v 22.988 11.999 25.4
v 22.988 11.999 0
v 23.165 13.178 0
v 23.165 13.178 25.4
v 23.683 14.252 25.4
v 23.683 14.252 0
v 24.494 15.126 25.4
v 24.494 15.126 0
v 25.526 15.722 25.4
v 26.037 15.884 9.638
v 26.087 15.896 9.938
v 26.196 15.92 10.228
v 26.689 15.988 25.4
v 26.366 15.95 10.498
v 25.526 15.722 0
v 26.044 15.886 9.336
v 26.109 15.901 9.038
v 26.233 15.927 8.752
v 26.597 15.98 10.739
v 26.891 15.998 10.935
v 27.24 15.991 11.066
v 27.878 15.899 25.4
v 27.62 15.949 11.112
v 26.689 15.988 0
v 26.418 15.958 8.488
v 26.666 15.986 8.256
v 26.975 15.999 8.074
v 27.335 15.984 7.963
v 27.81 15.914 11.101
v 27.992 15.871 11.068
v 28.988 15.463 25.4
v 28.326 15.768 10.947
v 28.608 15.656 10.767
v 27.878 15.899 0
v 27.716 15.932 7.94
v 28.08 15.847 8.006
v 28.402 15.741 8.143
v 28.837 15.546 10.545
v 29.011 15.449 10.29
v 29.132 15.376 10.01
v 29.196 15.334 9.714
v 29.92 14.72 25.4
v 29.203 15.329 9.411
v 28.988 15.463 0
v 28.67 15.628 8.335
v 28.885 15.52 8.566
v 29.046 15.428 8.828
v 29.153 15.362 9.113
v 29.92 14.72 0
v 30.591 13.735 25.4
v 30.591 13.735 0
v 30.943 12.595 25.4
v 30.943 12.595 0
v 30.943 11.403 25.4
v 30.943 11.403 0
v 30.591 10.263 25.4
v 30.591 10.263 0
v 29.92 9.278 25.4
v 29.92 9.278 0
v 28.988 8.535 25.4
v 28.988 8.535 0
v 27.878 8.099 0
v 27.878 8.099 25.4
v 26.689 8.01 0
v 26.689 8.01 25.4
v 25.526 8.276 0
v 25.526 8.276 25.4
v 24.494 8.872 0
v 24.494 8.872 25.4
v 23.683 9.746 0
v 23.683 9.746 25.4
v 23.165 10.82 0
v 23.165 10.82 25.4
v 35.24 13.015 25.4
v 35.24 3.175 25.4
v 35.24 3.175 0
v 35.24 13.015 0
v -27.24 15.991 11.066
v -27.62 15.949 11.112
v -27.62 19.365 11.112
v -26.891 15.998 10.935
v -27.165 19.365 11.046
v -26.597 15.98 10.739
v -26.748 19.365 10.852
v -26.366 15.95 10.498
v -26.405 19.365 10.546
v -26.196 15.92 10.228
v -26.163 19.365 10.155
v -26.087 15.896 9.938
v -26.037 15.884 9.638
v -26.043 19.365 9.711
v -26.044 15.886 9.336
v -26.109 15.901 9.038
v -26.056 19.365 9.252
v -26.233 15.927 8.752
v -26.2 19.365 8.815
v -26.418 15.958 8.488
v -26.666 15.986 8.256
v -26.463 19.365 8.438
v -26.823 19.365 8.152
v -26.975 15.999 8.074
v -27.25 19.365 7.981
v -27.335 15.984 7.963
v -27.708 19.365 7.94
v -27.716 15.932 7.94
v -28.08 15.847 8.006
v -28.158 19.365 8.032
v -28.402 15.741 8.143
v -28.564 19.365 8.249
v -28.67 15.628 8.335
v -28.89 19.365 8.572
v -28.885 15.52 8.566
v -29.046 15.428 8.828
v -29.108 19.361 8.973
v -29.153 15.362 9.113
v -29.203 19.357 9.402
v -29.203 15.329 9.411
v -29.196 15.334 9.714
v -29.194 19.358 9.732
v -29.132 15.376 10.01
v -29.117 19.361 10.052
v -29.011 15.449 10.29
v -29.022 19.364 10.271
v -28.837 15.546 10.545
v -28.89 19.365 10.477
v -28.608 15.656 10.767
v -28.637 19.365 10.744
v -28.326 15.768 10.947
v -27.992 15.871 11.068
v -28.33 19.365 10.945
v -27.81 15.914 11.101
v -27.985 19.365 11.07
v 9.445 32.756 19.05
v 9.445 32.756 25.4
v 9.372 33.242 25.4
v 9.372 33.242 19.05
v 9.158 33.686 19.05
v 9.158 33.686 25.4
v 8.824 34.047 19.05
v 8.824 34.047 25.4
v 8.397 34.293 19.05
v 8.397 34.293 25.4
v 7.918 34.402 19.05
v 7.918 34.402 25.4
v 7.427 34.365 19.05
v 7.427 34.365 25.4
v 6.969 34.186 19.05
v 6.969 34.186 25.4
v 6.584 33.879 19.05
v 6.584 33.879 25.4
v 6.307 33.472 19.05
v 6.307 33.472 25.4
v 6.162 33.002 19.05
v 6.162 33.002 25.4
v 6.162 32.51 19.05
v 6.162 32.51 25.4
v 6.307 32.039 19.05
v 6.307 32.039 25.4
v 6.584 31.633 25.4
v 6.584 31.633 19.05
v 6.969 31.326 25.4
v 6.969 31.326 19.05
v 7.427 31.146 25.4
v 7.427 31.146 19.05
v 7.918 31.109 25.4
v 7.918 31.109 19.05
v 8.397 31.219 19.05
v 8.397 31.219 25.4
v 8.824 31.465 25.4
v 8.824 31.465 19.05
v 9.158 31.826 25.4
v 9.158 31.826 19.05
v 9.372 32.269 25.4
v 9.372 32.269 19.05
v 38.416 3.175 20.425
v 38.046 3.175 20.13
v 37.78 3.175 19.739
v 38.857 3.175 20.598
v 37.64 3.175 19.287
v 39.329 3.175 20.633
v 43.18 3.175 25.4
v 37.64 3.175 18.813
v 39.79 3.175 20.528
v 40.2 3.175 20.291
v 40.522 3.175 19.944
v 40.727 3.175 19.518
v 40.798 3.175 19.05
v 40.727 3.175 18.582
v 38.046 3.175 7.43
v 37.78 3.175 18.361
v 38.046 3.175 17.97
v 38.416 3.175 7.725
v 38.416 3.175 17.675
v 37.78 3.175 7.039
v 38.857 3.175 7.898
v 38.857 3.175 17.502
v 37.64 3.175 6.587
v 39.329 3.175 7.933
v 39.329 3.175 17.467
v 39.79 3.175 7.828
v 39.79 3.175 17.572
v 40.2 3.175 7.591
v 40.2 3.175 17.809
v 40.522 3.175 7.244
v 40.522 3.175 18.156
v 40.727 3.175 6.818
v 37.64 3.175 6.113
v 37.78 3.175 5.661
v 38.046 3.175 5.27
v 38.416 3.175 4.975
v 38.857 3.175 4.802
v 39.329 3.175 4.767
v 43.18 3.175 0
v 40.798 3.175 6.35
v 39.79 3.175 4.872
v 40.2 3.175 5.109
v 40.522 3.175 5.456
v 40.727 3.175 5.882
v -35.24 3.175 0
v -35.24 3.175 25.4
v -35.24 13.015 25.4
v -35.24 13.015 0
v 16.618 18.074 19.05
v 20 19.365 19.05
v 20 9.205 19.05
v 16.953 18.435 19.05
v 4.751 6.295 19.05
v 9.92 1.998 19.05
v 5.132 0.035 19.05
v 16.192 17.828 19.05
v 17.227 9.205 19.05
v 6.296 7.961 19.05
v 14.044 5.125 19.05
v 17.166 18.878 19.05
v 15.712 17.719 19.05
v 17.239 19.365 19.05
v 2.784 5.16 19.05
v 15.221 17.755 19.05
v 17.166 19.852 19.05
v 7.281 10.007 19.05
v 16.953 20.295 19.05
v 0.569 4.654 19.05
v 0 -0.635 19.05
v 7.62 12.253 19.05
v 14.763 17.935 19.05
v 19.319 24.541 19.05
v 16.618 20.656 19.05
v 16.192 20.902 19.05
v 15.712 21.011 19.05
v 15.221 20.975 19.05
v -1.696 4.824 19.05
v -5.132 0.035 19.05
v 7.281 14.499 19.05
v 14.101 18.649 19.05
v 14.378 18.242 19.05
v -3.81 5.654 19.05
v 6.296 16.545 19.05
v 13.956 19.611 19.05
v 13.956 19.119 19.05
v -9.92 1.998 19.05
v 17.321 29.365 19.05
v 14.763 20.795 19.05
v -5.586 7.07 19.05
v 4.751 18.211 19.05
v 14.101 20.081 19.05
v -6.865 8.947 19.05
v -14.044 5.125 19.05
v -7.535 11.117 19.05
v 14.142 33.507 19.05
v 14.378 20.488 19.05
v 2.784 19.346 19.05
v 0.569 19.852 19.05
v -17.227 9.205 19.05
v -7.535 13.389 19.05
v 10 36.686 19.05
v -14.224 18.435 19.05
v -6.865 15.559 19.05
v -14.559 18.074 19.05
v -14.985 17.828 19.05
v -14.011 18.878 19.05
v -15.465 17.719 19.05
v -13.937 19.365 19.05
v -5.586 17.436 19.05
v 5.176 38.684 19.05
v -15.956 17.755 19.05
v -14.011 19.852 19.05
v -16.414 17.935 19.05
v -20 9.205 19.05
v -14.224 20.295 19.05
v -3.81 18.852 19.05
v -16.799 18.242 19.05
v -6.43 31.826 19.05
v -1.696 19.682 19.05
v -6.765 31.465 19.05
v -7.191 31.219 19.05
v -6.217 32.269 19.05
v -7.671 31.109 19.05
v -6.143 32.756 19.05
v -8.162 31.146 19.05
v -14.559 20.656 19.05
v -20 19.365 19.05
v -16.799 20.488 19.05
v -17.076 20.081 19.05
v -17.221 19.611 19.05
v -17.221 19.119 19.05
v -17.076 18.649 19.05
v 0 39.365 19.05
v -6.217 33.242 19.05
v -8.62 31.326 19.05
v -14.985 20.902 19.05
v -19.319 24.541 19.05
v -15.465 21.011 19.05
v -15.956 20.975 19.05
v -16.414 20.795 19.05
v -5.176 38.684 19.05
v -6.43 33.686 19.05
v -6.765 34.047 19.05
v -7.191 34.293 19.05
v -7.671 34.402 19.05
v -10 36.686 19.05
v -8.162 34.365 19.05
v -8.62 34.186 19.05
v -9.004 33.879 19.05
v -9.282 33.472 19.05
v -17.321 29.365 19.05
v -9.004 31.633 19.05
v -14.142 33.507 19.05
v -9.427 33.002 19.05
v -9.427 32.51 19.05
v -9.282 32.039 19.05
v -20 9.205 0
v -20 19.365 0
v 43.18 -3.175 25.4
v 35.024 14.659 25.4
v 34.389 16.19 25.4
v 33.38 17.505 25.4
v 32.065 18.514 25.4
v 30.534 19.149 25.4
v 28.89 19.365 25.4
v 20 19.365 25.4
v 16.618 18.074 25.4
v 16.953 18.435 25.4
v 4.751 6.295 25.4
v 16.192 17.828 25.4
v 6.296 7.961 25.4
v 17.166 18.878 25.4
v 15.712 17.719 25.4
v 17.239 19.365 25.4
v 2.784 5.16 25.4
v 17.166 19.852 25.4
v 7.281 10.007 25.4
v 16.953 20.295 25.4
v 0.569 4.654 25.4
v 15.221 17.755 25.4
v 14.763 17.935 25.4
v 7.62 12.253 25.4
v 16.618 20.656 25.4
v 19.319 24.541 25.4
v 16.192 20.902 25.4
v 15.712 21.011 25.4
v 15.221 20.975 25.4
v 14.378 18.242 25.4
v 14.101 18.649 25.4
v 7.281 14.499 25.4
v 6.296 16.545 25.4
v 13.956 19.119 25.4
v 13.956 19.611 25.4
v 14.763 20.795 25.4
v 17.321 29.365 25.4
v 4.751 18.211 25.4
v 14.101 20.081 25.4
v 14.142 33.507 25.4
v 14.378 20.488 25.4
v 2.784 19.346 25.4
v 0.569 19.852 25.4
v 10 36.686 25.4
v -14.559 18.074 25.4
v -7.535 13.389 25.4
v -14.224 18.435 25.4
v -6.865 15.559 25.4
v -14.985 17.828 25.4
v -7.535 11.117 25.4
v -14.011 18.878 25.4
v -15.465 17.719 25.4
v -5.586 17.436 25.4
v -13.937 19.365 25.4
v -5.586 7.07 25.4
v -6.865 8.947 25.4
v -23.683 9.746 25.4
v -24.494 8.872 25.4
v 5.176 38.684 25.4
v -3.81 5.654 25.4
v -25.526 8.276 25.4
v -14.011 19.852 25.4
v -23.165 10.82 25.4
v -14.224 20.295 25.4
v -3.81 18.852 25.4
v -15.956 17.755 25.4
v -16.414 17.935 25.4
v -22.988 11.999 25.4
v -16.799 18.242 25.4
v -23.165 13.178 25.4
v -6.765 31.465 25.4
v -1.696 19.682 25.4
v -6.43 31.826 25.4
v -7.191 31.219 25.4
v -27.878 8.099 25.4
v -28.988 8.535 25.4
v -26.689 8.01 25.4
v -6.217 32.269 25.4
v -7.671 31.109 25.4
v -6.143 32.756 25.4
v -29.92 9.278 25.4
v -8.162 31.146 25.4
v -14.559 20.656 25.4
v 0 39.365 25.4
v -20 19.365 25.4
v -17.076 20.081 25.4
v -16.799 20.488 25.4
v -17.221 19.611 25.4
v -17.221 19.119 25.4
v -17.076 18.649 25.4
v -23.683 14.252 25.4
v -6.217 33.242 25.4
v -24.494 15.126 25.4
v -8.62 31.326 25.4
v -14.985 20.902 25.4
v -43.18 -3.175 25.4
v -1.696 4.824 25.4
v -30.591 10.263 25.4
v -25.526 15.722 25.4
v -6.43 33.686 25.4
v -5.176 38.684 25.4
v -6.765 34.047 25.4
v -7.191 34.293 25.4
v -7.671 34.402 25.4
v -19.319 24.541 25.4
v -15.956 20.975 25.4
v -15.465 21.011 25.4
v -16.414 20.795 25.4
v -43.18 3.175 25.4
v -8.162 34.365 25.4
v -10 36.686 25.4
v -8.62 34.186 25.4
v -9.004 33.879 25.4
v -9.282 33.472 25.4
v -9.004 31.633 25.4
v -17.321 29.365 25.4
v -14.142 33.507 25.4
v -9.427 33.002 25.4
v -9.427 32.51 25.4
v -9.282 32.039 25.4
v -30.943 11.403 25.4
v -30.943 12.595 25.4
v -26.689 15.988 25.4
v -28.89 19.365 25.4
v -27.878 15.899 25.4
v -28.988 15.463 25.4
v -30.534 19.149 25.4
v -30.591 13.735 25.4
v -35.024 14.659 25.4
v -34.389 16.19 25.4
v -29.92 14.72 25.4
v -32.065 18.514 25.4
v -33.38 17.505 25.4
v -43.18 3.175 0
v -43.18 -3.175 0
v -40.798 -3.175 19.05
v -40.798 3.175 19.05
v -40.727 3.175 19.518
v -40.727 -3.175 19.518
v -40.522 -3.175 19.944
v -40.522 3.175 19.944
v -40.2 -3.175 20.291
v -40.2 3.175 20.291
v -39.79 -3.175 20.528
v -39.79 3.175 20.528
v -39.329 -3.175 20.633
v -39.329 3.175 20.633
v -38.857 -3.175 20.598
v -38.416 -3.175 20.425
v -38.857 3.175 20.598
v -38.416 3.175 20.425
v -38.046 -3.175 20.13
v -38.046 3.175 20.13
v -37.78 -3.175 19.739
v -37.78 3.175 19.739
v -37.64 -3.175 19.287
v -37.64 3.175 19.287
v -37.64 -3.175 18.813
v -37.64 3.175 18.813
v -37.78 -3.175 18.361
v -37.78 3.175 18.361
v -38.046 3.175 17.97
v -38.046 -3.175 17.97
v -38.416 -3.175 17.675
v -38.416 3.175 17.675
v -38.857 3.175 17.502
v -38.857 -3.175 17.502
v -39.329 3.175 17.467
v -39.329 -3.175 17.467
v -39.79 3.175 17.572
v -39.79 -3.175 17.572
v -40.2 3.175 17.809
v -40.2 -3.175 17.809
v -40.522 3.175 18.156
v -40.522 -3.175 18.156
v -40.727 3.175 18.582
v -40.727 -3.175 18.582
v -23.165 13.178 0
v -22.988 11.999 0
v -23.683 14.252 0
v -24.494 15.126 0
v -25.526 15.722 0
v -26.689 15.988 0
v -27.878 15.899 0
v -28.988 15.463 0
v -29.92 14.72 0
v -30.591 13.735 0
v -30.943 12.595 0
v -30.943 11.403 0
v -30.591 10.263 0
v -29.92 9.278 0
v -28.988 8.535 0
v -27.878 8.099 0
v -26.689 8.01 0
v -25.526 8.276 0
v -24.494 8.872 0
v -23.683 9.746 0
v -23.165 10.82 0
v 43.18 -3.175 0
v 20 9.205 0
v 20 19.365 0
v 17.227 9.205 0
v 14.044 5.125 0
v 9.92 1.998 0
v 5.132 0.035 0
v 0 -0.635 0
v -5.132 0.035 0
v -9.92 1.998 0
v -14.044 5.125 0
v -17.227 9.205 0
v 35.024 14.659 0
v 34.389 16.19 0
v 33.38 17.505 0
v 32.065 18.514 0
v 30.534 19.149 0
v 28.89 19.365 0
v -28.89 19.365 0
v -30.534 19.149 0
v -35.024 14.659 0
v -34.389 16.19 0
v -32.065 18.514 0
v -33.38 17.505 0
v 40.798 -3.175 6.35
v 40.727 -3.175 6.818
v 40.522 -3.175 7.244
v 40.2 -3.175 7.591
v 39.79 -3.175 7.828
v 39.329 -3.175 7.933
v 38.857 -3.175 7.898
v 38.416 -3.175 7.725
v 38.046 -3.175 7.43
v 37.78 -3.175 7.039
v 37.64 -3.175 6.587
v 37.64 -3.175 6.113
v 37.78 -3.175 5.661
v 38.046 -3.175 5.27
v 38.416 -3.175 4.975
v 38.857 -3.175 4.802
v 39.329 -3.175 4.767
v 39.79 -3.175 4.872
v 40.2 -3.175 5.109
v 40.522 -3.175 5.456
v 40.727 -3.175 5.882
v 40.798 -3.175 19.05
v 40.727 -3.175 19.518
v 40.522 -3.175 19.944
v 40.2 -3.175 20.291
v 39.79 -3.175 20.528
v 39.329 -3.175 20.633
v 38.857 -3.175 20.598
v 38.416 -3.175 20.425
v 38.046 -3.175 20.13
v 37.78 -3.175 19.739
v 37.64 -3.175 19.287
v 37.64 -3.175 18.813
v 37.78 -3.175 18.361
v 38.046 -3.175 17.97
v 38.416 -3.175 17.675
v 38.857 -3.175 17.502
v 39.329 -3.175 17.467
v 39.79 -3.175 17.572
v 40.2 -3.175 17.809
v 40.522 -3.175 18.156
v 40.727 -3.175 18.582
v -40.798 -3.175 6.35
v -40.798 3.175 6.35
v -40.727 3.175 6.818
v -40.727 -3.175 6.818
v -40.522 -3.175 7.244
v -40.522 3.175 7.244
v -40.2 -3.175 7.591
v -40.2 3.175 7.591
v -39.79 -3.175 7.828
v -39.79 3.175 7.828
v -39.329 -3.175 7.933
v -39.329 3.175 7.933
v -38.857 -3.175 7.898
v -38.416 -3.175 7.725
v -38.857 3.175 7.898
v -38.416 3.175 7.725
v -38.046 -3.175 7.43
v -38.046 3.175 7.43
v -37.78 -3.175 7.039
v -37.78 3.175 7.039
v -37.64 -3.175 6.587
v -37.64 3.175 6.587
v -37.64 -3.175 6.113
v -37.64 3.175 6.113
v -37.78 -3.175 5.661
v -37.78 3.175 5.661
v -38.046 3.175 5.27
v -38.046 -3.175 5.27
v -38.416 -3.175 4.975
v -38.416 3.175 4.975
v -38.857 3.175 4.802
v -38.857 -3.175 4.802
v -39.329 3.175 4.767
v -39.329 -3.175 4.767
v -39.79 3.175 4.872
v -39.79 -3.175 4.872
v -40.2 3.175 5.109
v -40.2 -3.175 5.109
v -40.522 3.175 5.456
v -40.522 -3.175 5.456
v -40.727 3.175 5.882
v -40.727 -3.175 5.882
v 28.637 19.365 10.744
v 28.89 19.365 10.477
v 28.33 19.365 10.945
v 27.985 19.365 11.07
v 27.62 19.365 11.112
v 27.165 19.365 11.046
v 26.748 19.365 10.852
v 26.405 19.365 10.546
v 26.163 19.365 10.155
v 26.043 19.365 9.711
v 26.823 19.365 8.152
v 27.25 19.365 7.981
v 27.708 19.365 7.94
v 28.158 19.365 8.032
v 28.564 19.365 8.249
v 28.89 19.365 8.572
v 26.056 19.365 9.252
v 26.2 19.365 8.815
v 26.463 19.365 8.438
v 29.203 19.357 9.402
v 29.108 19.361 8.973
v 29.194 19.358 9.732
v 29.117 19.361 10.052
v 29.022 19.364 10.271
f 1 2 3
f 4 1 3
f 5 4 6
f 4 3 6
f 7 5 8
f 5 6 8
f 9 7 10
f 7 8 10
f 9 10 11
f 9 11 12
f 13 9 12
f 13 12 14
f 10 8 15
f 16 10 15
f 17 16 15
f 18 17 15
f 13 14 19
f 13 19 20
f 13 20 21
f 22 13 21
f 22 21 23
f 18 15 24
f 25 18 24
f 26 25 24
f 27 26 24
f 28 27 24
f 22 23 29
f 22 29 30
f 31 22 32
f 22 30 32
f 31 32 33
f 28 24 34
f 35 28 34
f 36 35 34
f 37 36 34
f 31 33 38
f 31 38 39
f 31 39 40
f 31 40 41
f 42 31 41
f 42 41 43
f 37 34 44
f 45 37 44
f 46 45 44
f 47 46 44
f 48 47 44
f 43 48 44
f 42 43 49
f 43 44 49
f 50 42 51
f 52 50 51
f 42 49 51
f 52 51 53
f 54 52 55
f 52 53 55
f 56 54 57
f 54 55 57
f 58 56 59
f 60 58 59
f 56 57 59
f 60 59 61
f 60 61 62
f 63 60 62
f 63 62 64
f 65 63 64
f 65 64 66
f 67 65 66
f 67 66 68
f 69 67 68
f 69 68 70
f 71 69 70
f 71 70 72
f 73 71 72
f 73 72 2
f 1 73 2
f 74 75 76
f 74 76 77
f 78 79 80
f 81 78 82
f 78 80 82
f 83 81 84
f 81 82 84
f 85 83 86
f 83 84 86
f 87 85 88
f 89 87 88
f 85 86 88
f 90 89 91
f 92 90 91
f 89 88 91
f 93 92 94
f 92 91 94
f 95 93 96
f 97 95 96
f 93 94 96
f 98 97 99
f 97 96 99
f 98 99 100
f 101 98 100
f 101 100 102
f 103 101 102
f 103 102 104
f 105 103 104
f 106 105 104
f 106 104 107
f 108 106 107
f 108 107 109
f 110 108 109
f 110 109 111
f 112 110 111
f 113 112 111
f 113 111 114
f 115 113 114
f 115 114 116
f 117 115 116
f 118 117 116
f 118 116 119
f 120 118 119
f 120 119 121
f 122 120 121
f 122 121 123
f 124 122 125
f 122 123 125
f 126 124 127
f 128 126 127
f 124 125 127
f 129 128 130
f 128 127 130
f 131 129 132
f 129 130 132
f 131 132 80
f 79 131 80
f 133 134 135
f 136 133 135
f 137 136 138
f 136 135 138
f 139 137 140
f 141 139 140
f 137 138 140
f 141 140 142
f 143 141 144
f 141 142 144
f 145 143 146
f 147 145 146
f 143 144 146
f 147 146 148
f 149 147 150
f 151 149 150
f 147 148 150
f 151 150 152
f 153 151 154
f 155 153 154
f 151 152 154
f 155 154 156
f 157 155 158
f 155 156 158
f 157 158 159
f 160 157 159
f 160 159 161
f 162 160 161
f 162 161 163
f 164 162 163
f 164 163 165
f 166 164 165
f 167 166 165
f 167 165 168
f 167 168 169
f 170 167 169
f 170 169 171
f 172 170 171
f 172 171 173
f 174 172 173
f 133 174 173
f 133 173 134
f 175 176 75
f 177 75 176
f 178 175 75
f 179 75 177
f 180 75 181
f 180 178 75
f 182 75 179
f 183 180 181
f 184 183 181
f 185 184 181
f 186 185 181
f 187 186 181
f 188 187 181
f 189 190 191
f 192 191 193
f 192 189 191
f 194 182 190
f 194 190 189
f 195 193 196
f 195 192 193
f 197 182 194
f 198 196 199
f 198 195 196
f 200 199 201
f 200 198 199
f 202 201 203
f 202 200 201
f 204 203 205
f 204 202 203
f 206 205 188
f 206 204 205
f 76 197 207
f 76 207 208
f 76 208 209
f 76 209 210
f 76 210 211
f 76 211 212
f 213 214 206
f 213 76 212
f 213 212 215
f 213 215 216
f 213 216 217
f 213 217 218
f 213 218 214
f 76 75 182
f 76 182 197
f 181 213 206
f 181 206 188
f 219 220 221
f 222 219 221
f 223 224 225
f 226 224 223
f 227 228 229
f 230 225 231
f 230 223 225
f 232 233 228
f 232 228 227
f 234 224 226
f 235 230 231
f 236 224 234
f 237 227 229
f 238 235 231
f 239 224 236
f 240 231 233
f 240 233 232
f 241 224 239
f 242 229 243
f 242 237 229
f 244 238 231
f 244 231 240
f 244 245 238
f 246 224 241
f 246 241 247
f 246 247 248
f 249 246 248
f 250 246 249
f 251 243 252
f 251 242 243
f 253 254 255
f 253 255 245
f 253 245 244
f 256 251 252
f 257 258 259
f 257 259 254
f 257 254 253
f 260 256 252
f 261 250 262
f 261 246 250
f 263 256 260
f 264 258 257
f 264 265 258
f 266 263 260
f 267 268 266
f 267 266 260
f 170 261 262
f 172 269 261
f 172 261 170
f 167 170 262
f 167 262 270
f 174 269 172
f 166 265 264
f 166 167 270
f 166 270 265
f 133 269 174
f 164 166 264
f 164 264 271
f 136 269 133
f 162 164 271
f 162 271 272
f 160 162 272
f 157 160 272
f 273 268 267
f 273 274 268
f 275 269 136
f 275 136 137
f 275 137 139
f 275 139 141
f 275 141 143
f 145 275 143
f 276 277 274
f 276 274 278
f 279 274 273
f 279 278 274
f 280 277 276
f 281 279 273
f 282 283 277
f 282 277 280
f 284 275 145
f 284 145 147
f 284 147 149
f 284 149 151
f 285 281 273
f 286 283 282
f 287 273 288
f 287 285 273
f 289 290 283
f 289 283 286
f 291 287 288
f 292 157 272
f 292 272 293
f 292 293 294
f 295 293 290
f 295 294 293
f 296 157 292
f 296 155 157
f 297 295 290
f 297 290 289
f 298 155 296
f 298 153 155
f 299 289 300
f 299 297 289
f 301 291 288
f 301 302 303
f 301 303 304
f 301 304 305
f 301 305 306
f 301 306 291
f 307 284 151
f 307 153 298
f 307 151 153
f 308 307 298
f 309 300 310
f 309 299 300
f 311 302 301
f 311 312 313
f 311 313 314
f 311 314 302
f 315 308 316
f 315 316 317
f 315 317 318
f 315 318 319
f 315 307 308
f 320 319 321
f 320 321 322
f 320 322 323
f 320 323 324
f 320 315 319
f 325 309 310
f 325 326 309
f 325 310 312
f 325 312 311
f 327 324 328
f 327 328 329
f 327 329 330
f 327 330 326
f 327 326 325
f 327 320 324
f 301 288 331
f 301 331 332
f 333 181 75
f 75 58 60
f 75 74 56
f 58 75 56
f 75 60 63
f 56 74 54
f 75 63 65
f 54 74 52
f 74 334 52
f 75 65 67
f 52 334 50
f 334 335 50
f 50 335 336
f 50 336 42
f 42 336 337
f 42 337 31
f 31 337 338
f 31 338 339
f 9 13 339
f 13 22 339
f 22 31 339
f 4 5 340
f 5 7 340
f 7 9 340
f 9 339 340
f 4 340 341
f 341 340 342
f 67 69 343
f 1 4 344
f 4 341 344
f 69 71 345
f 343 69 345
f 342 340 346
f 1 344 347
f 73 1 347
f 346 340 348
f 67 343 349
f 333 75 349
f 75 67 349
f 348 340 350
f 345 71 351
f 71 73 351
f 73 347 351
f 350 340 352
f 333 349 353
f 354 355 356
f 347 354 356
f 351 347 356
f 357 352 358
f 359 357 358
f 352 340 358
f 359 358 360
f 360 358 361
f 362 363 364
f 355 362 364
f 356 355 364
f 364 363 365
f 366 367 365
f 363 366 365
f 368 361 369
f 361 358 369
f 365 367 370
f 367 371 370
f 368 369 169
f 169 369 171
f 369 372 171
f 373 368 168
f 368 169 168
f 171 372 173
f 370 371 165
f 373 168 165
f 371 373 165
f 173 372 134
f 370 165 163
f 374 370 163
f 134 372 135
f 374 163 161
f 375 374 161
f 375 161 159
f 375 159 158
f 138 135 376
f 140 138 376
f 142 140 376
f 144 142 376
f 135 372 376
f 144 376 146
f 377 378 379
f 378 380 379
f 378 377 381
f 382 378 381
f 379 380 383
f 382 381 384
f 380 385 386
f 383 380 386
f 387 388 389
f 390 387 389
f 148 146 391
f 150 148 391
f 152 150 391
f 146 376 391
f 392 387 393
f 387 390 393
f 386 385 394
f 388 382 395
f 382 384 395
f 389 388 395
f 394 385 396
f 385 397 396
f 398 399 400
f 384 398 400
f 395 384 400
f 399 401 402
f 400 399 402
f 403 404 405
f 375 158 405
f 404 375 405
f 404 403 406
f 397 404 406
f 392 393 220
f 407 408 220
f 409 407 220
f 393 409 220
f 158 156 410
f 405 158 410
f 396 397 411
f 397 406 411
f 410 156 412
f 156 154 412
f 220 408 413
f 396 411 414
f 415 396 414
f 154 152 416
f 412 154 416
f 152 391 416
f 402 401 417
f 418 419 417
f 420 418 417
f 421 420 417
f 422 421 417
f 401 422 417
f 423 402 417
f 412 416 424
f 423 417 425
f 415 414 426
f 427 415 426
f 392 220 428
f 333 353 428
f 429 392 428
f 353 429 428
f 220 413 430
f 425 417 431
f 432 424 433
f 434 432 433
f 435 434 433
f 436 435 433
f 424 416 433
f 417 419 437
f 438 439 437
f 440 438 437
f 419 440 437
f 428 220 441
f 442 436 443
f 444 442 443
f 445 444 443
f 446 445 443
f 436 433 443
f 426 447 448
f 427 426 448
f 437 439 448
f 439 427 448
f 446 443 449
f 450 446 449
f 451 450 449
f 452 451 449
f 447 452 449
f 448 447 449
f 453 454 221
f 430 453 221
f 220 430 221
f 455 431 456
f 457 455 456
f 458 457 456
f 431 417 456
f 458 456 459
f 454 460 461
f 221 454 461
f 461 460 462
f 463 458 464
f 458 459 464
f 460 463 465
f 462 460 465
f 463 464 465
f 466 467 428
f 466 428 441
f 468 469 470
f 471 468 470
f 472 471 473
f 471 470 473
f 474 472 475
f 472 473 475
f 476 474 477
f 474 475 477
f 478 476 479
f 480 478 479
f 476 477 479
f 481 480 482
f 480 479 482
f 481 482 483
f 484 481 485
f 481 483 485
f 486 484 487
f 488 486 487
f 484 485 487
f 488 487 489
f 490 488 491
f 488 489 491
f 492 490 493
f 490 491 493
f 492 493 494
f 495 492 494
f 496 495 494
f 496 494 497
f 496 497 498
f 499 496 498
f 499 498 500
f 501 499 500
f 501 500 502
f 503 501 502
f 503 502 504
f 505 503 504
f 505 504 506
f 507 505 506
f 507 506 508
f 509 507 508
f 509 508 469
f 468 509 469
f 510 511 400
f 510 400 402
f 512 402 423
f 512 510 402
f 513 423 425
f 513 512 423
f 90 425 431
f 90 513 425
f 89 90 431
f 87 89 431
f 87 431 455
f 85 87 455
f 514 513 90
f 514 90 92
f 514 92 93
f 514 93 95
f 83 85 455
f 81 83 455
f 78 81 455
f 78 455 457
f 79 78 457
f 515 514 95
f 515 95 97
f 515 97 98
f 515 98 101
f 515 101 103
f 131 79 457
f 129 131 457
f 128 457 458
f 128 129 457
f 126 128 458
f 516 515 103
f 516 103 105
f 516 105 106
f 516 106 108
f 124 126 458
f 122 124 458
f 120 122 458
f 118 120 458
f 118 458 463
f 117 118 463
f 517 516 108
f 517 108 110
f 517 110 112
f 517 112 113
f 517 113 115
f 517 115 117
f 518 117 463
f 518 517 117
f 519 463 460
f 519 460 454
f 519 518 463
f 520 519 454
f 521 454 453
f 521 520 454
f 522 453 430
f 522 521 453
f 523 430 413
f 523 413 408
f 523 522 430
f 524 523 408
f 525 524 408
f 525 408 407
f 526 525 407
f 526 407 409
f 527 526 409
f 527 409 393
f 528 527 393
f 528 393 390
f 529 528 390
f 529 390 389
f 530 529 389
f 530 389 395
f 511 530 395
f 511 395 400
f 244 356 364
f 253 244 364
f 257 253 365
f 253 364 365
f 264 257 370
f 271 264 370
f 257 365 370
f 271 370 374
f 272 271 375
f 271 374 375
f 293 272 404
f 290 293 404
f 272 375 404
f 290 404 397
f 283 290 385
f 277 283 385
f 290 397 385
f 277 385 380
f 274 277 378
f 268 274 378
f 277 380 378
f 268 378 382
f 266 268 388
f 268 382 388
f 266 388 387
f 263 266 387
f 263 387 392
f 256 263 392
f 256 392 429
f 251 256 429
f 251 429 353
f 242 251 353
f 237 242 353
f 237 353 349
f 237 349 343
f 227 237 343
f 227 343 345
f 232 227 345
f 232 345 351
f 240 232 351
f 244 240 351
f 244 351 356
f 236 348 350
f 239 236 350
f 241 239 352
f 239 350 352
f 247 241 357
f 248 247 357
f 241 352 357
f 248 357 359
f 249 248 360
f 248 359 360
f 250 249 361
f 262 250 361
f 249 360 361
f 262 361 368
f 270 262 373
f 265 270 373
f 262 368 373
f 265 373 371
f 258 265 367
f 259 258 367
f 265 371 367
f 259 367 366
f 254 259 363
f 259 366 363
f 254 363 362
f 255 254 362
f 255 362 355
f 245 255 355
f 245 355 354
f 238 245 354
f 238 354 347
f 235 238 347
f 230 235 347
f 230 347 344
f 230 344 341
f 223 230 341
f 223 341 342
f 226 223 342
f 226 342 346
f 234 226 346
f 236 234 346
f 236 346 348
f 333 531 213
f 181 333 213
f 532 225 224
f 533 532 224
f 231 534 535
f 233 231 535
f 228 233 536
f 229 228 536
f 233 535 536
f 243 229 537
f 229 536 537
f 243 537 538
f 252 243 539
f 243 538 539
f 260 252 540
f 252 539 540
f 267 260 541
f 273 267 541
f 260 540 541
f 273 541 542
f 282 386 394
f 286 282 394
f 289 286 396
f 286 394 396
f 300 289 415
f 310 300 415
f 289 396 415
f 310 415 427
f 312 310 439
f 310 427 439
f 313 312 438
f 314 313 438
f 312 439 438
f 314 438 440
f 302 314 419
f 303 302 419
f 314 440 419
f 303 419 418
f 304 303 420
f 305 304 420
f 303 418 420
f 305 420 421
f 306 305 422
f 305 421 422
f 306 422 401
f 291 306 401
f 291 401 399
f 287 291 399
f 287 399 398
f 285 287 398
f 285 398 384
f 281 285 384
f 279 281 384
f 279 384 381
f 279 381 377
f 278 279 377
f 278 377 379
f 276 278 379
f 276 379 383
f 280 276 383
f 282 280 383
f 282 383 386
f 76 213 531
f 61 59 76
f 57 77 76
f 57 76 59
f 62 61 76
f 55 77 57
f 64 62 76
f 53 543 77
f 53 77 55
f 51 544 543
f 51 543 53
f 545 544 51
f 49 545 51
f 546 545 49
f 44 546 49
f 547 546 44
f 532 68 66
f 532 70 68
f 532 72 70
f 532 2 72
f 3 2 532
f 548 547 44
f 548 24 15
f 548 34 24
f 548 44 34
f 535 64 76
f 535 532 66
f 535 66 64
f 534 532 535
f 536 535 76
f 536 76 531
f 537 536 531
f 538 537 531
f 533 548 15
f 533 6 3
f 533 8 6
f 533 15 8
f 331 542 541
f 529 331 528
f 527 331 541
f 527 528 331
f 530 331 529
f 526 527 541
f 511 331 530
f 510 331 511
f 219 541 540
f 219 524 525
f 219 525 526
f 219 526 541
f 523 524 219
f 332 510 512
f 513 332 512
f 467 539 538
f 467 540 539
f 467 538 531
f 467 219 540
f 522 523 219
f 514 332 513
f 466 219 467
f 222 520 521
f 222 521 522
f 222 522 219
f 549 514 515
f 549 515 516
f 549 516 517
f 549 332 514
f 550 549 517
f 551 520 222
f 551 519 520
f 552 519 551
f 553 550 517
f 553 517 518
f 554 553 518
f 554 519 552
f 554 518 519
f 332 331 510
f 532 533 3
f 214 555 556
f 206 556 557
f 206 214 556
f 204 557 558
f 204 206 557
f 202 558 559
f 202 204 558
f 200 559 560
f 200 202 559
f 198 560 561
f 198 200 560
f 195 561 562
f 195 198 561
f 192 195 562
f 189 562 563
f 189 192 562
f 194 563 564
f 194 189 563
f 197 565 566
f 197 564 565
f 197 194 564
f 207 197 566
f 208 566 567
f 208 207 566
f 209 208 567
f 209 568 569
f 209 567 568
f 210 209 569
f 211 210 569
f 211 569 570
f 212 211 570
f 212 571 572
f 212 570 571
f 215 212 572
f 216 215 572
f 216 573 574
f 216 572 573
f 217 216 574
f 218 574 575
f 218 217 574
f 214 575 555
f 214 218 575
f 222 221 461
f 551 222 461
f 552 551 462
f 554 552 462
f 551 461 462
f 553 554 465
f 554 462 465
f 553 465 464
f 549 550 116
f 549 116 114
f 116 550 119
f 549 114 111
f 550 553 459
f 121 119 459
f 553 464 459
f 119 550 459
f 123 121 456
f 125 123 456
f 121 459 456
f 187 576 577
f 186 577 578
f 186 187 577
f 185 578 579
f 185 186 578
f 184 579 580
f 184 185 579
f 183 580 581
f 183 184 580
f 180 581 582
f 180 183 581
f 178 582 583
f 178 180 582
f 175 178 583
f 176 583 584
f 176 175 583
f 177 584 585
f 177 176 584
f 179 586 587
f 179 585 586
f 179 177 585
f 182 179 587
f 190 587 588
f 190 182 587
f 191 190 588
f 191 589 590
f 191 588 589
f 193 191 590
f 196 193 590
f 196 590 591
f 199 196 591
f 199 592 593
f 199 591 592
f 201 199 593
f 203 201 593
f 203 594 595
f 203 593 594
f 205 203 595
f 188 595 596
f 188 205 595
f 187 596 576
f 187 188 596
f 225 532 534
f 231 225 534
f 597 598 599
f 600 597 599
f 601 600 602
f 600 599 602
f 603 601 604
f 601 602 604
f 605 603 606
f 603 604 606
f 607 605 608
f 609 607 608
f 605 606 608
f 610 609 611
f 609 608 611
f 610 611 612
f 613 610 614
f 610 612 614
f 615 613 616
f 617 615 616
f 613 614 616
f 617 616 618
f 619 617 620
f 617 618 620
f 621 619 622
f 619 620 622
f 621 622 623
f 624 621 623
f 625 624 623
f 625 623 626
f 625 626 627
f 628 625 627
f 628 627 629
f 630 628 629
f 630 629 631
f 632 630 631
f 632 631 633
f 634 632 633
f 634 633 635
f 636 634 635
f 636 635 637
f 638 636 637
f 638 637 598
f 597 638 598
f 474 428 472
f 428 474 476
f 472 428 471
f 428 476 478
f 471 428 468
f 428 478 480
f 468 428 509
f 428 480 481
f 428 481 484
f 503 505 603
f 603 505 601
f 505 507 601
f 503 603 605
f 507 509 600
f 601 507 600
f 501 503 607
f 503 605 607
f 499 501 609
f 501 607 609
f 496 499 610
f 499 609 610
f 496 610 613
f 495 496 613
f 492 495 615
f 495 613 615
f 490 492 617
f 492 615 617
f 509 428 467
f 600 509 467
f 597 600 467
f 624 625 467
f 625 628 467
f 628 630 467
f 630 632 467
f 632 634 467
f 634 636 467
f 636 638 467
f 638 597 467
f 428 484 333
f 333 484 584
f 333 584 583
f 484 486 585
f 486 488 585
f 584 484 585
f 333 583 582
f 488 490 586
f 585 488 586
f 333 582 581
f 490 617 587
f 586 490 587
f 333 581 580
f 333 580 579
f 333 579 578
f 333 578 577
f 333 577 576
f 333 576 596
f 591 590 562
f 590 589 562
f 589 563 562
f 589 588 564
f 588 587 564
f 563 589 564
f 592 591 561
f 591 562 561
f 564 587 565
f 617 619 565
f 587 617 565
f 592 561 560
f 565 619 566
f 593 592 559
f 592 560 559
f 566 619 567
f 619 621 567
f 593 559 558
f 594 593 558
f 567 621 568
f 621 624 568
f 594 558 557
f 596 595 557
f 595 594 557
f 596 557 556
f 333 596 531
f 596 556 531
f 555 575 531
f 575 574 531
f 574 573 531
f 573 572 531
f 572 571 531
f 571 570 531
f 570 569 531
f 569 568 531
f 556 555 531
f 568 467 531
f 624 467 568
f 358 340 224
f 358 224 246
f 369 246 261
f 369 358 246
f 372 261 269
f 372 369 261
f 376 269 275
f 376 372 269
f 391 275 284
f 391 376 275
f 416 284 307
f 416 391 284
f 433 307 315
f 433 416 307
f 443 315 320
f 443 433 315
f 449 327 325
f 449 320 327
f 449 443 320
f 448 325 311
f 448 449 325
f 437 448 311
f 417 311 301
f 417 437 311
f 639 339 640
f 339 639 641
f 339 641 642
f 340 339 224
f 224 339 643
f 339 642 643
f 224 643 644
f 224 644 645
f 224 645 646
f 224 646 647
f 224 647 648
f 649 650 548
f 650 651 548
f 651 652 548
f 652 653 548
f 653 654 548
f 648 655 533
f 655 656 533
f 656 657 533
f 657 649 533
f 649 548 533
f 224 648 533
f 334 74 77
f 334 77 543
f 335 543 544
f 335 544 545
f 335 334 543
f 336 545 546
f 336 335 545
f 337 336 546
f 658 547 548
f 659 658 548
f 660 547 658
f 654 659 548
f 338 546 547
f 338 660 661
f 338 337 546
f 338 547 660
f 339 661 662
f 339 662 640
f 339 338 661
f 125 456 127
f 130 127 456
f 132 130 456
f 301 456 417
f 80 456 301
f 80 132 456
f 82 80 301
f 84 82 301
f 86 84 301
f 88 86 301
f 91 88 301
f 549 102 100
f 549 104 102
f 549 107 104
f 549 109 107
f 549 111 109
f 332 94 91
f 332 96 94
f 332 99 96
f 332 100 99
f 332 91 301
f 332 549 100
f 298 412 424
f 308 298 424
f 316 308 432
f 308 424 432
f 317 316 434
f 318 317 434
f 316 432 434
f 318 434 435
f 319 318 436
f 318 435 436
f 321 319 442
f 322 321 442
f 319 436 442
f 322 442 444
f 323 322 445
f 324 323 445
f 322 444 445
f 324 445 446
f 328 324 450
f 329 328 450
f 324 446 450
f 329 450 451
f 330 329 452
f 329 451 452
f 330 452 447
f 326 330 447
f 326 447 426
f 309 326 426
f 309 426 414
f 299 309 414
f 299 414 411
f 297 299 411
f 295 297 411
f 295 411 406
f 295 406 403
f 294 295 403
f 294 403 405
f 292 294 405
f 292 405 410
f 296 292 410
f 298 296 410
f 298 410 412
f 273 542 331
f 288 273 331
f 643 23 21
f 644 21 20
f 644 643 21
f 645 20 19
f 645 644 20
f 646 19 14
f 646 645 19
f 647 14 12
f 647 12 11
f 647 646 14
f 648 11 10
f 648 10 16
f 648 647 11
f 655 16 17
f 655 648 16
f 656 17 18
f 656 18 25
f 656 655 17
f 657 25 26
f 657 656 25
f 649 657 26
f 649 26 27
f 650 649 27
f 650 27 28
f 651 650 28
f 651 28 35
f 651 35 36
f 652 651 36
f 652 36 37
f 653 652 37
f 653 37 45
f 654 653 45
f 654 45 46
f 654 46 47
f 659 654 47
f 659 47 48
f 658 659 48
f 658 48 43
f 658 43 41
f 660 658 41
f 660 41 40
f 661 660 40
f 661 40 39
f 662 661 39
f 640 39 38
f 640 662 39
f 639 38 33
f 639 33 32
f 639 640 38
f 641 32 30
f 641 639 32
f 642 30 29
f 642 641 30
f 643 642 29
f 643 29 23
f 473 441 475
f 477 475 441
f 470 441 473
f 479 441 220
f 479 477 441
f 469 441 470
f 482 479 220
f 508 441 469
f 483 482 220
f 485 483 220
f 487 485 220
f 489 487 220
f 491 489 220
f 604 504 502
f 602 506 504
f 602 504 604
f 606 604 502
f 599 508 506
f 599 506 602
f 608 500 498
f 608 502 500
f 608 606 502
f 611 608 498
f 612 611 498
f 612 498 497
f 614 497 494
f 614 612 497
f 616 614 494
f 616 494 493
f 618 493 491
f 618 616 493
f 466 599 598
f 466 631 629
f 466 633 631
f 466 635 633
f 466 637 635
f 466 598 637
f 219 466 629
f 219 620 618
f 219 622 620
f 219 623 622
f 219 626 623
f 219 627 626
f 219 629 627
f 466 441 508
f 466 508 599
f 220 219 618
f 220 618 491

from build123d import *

# Parameters (mm, degrees)
SKETCH1_W               = 86.36
SKETCH1_H               = 6.35
BOSS_EXTRUDE1_DEPTH     = 25.4
BOSS_EXTRUDE2_DEPTH     = 25.4
SKETCH3_R               = 7.62
SKETCH3_R_2             = 1.651
CUT_EXTRUDE3_DEPTH      = 25.4
SKETCH4_R               = 20
CUT_EXTRUDE4_DEPTH      = 19.05
SKETCH6_W               = 40
SKETCH6_H               = 10.16
CUT_EXTRUDE6_DEPTH      = 19.05
BOSS_EXTRUDE3_START     = -25.4
SKETCH7_W               = 15.24
SKETCH7_H               = 16.19
SKETCH7_R               = 4
BOSS_EXTRUDE3_DEPTH     = 25.4
FILLET1_R               = 6.35
SKETCH9_R               = 1.5875
CUT_EXTRUDE7_DEPTH      = 62.801201445
CUT_EXTRUDE8_REACH      = 56.934
CUT_EXTRUDE8_END_RADIUS = 4
SKETCH11_R              = 1.5875


with BuildPart() as part:
    # Sketch1 → Boss-Extrude1 (new body)
    with BuildSketch(Plane.XY):
        Rectangle(SKETCH1_W, SKETCH1_H)
    extrude(amount=BOSS_EXTRUDE1_DEPTH)

    # Sketch2 → Boss-Extrude2 (add)
    with BuildSketch(Plane.XY.offset(25.4)):
        with BuildLine():
            ThreePointArc((20, 19.365), (0, 39.365), (-20, 19.365))
            ThreePointArc((-20, 19.365), (-17.816396252, 10.277864885), (-11.742397541, 3.175))
            Line((-11.742397541, 3.175), (11.742397541, 3.175))
            ThreePointArc((11.742397541, 3.175), (17.816396252, 10.277864885), (20, 19.365))
        make_face()
        with BuildLine():
            Line((11.742397541, 3.175), (-11.742397541, 3.175))
            ThreePointArc((-11.742397541, 3.175), (0, -0.635), (11.742397541, 3.175))
        make_face()
        with BuildLine():
            ThreePointArc((-11.742397541, 3.175), (-17.816396252, 10.277864885), (-20, 19.365))
            Line((-20, 19.365), (-20, 3.175))
            Line((-20, 3.175), (-11.742397541, 3.175))
        make_face()
        with BuildLine():
            Line((20, 3.175), (20, 19.365))
            ThreePointArc((20, 19.365), (17.816396252, 10.277864885), (11.742397541, 3.175))
            Line((11.742397541, 3.175), (20, 3.175))
        make_face()
    extrude(amount=-BOSS_EXTRUDE2_DEPTH)

    # Sketch3 → Cut-Extrude3 (cut)
    with BuildSketch(Plane.XY.offset(25.4)):
        with Locations((0, 12.253)):
            Circle(SKETCH3_R)
        with Locations((-7.79423, 32.755818299)):
            Circle(SKETCH3_R_2)
        with Locations((7.79423, 32.755818299)):
            Circle(SKETCH3_R_2)
        with Locations((-15.58846, 19.365)):
            Circle(SKETCH3_R_2)
        with Locations((15.58846, 19.365)):
            Circle(SKETCH3_R_2)
    extrude(amount=-CUT_EXTRUDE3_DEPTH, mode=Mode.SUBTRACT)

    # Sketch4 → Cut-Extrude4 (cut)
    with BuildSketch(Plane(origin=(0, 0, 0), x_dir=(-1, 0, 0), z_dir=(0, 0, -1))):
        with Locations((0, 19.365)):
            Circle(SKETCH4_R)
    extrude(amount=-CUT_EXTRUDE4_DEPTH, mode=Mode.SUBTRACT)

    # Sketch6 → Cut-Extrude6 (cut)
    with BuildSketch(Plane(origin=(0, 0, 0), x_dir=(-1, 0, 0), z_dir=(0, 0, -1))):
        with Locations((0, 14.285)):
            Rectangle(SKETCH6_W, SKETCH6_H)
    extrude(amount=-CUT_EXTRUDE6_DEPTH, mode=Mode.SUBTRACT)

    # Sketch7 → Boss-Extrude3 (add)
    with BuildSketch(Plane.XY.offset(25.4).offset(BOSS_EXTRUDE3_START)):
        with Locations((-27.62, 11.27)):
            Rectangle(SKETCH7_W, SKETCH7_H)
        with Locations((-26.9875, 11.999)):
            Circle(SKETCH7_R, mode=Mode.SUBTRACT)
    boss_extrude3 = extrude(amount=BOSS_EXTRUDE3_DEPTH)

    # Mirror2: Boss-Extrude3 across plane
    add(boss_extrude3.mirror(Plane(origin=(0, 0, 0), x_dir=(0, 0, 1), z_dir=(1, 0, 0))))

    # Fillet1
    fillet1_edges = [part.edges().sort_by_distance(p)[0] for p in [
        (-35.24, 19.365, 12.7),
        (35.24, 19.365, 12.7),
    ]]
    fillet(fillet1_edges, radius=FILLET1_R)

    # Sketch9 → Cut-Extrude7 (cut, through all)
    with BuildSketch(Plane(origin=(0, 3.175, 0), x_dir=(1, 0, 0), z_dir=(0, 1, 0))):
        with Locations(Location((-39.21, -6.35, 0), (0, 0, 180))):
            Circle(SKETCH9_R)
        with Locations(Location((-39.21, -19.05, 0), (0, 0, 180))):
            Circle(SKETCH9_R)
    cut_extrude7 = extrude(amount=-CUT_EXTRUDE7_DEPTH, mode=Mode.SUBTRACT)

    # Mirror3: Cut-Extrude7 across plane
    add(cut_extrude7.mirror(Plane(origin=(0, 0, 0), x_dir=(0, 0, 1), z_dir=(1, 0, 0))), mode=Mode.SUBTRACT)

    # Cut-Extrude8: up to this cylinder (the profile starts outside it)
    cut_extrude8_end = Plane(origin=(-26.9875, 11.999, 9.525), z_dir=(0, 0, 1)) * Cylinder(CUT_EXTRUDE8_END_RADIUS, 122.868, mode=Mode.PRIVATE)
    # Sketch11 → Cut-Extrude8 (cut, up to the surface)
    with BuildSketch(Plane(origin=(0, 19.365, 0), x_dir=(1, 0, 0), z_dir=(0, 1, 0)), mode=Mode.PRIVATE) as cut_extrude8_sk1:
        with Locations(Location((-27.62, -9.525, 0), (0, 0, 270))):
            Circle(SKETCH11_R)
    cut_extrude8_tool1 = extrude(cut_extrude8_sk1.sketch, amount=-CUT_EXTRUDE8_REACH, mode=Mode.PRIVATE) - cut_extrude8_end
    cut_extrude8 = cut_extrude8_tool1.solids().sort_by_distance((-27.62, 19.365, 9.525))[0]
    add(cut_extrude8, mode=Mode.SUBTRACT)

    # Mirror4: Cut-Extrude8 across plane
    add(cut_extrude8.mirror(Plane(origin=(0, 0, 0), x_dir=(0, 0, 1), z_dir=(1, 0, 0))), mode=Mode.SUBTRACT)


solid = part.part
